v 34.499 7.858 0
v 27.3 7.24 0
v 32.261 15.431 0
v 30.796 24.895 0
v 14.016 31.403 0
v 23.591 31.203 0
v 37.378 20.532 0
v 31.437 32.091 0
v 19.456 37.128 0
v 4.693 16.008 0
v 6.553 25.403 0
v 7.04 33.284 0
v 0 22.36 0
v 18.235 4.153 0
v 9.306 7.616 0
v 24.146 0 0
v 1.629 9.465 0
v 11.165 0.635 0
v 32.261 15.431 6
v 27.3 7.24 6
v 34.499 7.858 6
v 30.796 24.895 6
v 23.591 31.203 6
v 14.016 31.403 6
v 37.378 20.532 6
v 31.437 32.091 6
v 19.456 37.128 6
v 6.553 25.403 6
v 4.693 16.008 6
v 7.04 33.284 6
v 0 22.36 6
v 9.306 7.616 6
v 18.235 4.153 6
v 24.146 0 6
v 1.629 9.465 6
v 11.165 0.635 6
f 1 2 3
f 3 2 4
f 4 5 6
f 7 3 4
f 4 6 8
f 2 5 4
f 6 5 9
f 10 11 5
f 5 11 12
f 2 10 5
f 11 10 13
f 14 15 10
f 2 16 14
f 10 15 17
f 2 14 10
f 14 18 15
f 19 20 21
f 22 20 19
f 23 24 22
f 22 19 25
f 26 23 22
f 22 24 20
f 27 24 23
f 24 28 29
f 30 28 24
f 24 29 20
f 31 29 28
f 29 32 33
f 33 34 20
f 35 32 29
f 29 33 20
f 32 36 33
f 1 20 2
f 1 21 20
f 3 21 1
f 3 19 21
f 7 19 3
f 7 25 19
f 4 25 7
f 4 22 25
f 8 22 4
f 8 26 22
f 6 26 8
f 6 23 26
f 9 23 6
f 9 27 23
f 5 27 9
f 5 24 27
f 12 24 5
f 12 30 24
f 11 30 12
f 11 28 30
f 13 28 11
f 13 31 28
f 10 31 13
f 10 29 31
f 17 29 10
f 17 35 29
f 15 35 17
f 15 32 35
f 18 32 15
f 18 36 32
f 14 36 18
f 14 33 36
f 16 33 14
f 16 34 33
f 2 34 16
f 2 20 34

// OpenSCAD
$fn = 32;

// ----------------------------------------------------------------------
// Chain sprocket: 9 teeth, 14 mm root radius
// ----------------------------------------------------------------------

// --- parameters (mm) ---
profile_height = 6;       // extrusion height
profile_points = 18;      // points of the closed outline

profile = [[32.261, 15.431], [37.378, 20.532], [30.796, 24.895], [31.437, 32.091], [23.591, 31.203], [19.456, 37.128], [14.016, 31.403], [7.04, 33.284], [6.553, 25.403], [0, 22.36], [4.693, 16.008], [1.629, 9.465], [9.306, 7.616], [11.165, 0.635], [18.235, 4.153], [24.146, 0], [27.3, 7.24], [34.499, 7.858]];  // single closed polygon, 18 points, counter clockwise

// --- the one profile operation ---
linear_extrude(height = profile_height) polygon(points = profile);
